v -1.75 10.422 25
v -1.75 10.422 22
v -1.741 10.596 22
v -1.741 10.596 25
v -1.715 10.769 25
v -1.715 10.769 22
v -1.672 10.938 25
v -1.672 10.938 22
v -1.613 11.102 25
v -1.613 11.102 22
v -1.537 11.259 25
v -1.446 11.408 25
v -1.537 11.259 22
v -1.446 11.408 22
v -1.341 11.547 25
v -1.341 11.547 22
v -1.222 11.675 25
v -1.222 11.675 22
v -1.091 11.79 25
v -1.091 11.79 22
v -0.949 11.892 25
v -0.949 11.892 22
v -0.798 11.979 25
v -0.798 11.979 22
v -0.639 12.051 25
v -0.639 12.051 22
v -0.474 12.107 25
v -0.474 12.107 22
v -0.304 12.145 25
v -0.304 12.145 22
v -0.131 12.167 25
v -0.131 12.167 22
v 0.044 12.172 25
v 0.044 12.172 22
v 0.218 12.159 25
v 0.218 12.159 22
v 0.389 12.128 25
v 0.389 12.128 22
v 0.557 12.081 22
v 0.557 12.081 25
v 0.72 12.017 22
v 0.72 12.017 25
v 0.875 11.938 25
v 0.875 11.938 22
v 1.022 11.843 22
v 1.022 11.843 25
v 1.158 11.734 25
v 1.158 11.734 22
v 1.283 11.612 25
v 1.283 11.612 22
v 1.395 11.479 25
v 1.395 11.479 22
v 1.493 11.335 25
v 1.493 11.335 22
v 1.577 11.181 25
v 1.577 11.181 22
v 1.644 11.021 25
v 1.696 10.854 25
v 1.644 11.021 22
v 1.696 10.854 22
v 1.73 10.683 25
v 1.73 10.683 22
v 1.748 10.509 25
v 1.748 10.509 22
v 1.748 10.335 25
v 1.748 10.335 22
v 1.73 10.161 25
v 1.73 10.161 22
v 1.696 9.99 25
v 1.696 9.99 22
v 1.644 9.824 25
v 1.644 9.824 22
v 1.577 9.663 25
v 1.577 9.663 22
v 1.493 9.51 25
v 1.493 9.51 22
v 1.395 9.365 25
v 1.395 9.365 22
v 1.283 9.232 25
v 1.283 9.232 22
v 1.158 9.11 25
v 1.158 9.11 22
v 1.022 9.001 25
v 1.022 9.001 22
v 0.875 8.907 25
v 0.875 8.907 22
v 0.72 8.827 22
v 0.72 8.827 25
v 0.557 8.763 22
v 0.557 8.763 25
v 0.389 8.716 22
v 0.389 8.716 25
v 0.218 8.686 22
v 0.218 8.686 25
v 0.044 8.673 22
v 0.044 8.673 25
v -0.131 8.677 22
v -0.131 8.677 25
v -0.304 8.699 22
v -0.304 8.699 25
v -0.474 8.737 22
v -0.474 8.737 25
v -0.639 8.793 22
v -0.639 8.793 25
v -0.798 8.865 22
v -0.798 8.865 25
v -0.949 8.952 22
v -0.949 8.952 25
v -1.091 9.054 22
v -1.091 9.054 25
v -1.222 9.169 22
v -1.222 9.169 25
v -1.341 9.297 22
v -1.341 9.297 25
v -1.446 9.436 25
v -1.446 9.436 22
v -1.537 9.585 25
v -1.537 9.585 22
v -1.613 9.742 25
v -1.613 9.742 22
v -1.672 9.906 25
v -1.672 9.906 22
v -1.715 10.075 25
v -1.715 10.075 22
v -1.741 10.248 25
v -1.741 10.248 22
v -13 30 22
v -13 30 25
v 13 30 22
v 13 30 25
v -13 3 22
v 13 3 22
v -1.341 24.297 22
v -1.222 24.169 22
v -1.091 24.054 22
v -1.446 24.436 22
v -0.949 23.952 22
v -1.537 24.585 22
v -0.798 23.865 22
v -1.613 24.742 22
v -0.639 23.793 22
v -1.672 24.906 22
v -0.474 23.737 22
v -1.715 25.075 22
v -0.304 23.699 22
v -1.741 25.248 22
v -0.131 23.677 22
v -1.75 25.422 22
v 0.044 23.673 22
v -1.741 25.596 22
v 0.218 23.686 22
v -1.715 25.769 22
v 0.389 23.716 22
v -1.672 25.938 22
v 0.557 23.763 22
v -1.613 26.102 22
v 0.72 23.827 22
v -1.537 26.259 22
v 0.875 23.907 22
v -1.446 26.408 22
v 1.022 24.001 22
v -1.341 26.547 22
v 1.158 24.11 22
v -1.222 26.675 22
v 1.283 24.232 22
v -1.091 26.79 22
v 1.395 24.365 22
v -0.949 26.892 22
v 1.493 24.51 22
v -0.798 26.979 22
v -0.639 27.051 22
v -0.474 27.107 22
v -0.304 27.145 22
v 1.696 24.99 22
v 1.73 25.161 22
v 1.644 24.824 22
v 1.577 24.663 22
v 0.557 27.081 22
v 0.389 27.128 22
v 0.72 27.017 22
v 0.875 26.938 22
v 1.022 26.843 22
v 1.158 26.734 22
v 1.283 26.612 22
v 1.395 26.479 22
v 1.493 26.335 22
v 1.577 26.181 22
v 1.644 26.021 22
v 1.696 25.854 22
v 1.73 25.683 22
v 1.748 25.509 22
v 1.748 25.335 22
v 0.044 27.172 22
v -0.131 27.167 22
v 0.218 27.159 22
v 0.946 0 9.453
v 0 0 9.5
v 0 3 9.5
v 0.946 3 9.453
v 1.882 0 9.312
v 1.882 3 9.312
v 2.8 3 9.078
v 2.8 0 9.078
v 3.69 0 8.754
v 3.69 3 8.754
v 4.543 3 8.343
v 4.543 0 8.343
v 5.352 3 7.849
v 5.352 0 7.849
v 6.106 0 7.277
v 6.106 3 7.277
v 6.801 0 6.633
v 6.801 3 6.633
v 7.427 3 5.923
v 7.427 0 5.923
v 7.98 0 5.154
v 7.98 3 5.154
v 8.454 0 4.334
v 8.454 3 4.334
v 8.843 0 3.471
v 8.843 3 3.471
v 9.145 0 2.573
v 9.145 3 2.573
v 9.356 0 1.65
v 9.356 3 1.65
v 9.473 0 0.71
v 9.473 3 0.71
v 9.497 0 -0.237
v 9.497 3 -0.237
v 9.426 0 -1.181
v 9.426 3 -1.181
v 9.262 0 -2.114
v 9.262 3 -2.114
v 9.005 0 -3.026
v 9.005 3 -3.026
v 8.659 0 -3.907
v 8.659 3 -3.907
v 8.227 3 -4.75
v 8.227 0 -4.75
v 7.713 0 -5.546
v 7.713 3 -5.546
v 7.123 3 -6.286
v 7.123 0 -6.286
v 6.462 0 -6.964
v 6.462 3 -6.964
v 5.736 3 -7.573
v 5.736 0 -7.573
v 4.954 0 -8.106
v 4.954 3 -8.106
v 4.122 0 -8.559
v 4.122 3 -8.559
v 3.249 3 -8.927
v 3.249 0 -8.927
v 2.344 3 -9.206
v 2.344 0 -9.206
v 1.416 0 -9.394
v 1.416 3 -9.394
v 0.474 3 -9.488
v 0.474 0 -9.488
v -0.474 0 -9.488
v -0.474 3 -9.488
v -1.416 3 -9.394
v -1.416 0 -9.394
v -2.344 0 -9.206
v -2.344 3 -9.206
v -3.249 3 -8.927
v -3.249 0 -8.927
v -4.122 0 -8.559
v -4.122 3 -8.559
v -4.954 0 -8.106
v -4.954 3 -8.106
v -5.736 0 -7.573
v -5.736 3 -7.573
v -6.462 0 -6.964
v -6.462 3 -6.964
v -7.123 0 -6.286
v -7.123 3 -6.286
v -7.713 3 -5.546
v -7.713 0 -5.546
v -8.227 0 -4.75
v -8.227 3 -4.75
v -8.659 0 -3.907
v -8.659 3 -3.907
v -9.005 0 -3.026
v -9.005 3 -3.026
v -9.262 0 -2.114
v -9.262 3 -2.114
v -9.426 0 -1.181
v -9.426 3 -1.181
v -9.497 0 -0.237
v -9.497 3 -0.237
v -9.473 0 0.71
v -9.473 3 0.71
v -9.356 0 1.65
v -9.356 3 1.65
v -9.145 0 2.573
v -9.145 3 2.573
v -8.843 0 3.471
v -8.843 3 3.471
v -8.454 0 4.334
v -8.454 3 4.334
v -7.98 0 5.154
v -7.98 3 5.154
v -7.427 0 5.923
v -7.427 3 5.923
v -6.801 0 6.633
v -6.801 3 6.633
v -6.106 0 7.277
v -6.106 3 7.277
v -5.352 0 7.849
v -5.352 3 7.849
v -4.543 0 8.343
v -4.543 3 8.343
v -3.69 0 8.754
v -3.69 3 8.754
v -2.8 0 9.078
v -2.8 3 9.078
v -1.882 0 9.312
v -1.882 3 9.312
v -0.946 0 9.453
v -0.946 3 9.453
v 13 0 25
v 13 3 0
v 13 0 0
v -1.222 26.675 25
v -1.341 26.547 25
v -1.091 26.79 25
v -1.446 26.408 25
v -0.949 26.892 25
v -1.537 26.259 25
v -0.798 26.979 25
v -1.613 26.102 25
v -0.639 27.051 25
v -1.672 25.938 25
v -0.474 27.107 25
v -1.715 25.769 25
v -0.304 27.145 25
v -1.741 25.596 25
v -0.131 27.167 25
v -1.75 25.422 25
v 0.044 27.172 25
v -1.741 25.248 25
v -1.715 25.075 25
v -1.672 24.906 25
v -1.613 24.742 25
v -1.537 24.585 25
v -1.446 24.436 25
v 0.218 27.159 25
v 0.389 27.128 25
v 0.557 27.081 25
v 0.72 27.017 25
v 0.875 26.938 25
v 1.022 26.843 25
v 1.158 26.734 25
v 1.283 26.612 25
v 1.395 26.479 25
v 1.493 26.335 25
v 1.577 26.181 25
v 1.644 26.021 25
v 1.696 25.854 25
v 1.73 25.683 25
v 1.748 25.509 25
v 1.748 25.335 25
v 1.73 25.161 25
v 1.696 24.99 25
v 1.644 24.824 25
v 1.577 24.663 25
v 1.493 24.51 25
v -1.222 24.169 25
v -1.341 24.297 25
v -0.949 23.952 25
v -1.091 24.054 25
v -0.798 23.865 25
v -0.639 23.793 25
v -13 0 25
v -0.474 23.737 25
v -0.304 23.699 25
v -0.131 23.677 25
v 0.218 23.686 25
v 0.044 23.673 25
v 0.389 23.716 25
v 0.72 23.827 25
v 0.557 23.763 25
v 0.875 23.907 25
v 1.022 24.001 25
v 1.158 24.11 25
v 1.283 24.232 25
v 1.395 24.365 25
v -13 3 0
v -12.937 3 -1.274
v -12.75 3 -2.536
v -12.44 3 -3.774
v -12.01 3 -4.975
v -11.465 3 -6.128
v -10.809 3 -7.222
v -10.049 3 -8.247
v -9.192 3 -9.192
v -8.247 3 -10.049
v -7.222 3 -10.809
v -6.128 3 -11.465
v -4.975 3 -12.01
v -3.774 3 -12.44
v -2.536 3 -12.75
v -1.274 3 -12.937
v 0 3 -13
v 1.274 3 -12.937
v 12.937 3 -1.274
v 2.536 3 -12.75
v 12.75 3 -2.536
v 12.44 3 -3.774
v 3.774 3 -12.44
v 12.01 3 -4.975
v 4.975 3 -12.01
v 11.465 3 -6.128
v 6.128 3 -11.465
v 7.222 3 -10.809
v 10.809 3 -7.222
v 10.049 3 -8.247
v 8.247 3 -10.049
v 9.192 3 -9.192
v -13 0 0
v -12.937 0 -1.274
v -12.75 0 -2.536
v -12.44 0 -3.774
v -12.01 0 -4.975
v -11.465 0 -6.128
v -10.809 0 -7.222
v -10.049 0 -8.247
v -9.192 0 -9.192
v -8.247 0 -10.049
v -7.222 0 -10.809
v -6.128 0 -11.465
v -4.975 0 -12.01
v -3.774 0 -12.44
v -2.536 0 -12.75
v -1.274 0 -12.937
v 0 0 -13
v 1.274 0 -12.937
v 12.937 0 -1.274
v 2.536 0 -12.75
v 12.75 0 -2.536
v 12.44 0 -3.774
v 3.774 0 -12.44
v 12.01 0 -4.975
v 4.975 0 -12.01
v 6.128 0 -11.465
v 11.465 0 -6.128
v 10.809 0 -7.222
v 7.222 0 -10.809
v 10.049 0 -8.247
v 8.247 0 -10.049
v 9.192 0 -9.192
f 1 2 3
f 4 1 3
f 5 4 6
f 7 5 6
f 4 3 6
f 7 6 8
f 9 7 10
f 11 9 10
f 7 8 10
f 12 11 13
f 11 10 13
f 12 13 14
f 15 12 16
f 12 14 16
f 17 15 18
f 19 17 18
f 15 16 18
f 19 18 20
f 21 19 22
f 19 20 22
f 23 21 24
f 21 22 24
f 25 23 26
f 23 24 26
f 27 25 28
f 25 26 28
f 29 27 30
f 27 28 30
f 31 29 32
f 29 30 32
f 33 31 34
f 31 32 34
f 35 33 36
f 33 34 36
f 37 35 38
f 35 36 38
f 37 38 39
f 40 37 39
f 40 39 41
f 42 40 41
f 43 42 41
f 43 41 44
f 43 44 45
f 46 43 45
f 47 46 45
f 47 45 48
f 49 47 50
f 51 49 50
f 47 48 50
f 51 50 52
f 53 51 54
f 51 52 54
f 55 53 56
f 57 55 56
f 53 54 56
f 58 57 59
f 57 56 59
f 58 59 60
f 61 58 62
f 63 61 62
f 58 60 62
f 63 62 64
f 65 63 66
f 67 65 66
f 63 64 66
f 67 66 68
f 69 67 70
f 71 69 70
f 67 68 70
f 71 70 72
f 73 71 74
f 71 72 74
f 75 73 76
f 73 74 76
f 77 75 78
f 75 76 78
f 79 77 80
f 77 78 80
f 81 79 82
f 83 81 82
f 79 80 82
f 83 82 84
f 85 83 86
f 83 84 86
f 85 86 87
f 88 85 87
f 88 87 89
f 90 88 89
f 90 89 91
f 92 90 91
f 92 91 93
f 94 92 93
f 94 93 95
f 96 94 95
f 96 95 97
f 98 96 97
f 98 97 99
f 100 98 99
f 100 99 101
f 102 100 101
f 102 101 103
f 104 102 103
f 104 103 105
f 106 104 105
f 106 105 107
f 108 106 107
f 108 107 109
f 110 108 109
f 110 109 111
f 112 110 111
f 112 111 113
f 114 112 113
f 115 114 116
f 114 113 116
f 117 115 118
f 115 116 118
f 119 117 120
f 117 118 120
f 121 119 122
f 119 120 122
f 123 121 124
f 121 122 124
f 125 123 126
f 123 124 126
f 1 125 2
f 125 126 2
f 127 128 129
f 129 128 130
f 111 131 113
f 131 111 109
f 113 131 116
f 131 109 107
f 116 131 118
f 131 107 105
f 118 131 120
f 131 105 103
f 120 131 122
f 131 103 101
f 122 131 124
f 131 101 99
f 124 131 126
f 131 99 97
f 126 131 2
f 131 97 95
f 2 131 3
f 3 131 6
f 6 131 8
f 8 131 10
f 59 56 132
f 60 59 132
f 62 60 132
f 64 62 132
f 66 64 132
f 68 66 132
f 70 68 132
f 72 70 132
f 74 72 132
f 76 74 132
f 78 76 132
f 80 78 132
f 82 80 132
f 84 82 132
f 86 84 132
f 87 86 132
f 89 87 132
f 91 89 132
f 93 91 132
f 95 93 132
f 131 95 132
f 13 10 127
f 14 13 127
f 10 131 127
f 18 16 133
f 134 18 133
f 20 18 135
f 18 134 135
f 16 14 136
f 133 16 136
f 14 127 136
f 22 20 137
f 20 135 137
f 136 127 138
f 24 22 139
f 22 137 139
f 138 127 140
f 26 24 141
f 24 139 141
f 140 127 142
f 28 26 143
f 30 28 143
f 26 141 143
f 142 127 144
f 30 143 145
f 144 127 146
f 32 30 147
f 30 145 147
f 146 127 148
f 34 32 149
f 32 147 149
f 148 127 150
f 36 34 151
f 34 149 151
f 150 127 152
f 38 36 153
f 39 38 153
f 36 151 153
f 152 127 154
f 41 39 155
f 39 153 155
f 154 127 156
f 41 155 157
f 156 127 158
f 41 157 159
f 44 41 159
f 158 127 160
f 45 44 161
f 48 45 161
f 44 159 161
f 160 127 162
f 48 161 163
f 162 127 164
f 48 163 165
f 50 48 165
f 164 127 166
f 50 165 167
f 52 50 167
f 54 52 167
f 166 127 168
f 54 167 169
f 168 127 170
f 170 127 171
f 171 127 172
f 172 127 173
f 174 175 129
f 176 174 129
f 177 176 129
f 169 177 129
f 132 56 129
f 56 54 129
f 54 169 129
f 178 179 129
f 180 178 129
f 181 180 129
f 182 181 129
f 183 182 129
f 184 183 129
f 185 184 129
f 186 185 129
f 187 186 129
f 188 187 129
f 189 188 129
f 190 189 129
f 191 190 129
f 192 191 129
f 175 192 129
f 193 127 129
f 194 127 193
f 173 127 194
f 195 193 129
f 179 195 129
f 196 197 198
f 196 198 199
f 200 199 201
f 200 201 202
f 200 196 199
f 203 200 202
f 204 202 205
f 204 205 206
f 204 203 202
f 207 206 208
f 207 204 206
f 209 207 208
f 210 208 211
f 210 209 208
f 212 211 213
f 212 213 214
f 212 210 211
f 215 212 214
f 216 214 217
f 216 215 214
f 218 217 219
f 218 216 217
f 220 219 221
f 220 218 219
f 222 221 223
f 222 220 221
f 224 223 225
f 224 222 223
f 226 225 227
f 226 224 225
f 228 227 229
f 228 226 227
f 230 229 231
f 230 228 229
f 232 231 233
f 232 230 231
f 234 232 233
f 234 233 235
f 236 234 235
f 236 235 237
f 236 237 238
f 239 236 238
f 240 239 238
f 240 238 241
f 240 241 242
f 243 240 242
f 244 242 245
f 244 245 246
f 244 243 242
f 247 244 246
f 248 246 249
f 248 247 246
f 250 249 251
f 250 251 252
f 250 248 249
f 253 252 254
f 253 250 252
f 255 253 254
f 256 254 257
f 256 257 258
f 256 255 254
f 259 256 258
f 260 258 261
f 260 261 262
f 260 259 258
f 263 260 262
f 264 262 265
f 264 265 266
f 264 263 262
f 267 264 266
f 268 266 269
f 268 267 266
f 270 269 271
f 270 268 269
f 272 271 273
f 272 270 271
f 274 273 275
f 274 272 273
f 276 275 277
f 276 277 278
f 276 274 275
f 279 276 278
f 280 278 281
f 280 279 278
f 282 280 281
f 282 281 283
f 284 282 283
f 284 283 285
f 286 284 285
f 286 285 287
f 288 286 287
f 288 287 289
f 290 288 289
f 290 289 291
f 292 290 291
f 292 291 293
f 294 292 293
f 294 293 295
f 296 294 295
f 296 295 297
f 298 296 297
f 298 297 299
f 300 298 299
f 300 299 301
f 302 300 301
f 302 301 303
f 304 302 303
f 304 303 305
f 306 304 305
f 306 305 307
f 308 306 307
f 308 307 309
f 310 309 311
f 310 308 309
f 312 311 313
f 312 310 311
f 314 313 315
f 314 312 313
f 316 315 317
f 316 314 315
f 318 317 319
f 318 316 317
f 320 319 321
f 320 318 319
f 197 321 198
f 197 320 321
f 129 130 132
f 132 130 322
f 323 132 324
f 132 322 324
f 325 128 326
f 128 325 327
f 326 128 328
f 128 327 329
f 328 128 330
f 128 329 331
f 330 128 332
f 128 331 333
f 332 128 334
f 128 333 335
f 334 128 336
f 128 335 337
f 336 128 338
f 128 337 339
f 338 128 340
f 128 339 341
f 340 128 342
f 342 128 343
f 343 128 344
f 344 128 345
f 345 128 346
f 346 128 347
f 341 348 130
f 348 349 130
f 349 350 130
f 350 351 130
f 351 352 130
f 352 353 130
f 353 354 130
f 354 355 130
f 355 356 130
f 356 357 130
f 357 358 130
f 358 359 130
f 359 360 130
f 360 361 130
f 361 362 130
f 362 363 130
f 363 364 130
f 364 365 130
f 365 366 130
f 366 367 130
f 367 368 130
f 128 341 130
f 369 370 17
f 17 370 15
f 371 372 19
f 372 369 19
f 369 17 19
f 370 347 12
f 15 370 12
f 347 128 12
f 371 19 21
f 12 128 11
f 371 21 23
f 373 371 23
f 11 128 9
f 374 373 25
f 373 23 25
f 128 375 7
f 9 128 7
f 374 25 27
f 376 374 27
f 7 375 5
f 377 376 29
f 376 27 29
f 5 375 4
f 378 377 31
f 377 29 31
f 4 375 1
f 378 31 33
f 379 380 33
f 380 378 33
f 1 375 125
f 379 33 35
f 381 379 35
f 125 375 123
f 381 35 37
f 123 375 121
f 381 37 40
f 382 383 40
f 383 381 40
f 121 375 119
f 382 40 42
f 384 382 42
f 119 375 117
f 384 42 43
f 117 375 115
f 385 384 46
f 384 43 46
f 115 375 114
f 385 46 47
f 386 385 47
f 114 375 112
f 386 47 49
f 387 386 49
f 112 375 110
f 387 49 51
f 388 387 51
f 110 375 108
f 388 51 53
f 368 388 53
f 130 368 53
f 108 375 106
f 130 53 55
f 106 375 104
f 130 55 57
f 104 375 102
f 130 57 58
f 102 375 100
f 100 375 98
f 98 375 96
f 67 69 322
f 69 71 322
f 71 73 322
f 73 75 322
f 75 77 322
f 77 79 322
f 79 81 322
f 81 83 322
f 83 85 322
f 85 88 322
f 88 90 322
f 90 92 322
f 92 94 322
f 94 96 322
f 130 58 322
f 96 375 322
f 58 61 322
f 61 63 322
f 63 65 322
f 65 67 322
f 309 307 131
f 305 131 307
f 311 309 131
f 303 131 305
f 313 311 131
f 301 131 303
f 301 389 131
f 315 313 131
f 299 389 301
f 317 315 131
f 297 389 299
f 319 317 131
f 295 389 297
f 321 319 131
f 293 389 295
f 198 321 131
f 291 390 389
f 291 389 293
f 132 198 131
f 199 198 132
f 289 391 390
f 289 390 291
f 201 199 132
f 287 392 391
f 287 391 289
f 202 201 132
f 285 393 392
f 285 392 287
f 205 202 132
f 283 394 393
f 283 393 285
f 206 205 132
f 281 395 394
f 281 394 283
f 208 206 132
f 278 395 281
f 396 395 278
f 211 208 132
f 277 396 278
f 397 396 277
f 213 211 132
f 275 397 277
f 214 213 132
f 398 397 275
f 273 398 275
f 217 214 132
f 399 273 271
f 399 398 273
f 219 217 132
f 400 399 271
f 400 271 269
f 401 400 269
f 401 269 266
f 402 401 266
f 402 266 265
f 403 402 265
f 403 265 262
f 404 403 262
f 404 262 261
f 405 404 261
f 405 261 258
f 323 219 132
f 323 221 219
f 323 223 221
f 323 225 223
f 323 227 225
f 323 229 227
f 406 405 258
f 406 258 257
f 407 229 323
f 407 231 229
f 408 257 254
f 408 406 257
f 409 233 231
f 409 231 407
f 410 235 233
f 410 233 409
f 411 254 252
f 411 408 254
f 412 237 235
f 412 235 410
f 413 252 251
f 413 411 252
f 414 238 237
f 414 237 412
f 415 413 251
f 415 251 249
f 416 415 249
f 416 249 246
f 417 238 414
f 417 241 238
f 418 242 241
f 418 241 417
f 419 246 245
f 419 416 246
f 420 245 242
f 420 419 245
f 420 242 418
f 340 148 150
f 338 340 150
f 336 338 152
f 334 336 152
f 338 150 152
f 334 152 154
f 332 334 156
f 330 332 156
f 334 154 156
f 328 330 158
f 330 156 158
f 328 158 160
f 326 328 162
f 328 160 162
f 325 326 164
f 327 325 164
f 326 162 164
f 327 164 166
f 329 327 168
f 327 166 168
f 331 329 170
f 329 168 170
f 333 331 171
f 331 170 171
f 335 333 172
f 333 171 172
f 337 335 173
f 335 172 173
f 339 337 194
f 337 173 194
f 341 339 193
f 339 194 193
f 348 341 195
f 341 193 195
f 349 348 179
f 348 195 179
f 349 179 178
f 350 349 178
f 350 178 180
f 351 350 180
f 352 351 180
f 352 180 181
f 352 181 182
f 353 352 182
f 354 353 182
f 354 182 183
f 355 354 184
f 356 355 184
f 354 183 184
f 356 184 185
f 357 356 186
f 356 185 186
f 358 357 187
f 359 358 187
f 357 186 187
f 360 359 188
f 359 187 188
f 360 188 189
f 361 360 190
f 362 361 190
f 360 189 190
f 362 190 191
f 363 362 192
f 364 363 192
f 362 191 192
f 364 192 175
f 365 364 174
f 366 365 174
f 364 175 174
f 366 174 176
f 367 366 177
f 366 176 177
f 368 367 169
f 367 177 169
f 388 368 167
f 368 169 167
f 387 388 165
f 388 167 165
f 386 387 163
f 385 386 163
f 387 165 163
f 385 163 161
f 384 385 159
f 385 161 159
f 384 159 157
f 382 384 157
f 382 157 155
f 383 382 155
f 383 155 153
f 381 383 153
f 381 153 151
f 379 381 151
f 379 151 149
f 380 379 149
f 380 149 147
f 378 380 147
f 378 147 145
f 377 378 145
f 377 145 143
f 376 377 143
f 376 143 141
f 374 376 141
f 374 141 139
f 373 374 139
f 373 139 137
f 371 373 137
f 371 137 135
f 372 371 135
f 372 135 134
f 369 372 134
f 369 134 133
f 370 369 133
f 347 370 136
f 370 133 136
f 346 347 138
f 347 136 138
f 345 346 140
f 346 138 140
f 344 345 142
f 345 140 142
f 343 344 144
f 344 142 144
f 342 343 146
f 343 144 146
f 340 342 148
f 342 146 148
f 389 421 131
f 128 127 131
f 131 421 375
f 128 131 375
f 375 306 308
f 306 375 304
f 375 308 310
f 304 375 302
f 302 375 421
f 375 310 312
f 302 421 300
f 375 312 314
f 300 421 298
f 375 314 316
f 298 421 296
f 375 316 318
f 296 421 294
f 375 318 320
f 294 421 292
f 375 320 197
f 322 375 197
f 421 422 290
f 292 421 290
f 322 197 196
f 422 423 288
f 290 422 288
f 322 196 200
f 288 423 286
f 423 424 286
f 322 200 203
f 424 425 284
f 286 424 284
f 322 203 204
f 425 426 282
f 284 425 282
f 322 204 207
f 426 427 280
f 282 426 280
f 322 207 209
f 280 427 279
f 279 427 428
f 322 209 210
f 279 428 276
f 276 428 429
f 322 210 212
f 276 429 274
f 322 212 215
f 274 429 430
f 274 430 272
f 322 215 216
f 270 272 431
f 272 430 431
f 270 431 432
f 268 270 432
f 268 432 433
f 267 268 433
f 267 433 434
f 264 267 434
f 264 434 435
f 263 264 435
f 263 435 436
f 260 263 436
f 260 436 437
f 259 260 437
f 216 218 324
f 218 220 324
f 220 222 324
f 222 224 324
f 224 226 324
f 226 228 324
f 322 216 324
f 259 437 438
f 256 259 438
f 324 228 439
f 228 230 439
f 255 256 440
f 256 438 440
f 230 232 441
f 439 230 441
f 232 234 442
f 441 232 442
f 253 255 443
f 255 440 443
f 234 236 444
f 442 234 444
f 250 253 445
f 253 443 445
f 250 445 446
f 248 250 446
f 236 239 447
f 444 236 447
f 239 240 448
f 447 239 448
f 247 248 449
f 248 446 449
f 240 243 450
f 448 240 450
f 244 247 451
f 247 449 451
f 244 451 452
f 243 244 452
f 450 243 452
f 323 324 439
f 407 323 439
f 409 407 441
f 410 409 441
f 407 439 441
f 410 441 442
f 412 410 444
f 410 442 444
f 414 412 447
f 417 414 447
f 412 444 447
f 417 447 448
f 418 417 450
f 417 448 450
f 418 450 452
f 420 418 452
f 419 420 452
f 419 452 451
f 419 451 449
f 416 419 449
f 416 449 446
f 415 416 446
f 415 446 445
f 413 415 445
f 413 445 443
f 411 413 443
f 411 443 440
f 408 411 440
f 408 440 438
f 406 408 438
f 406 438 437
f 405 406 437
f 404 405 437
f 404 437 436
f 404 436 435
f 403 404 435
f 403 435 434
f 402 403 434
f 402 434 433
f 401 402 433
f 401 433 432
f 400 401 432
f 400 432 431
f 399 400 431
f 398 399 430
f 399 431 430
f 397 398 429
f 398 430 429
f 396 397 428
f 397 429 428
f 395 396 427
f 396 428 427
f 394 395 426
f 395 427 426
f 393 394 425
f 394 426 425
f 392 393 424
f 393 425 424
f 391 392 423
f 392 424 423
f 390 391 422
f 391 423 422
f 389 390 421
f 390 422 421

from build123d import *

# Parameters (mm, degrees)
SKETCH_1_R          = 13
SKETCH_1_R_2        = 9.5
EXTRUDE_1_DEPTH     = 3
SKETCH_2_W          = 26
SKETCH_2_H          = 30
EXTRUDE_2_DEPTH     = 3
SKETCH_3_R          = 1.75
CUT_EXTRUDE_1_DEPTH = 3


with BuildPart() as part:
    # 草图1 → 凸台-拉伸1 (new body)
    # profile 1 of 2: a face of its own
    with BuildSketch(Plane(origin=(0, 0, 0), x_dir=(1, 0, 0), z_dir=(0, 1, 0))):
        Circle(SKETCH_1_R)
        with Locations(Location((0, 0, 0), (0, 0, 270))):
            Circle(SKETCH_1_R_2, mode=Mode.SUBTRACT)
    # profile 2 of 2: a face of its own
    with BuildSketch(Plane(origin=(0, 0, 0), x_dir=(1, 0, 0), z_dir=(0, 1, 0))):
        with BuildLine():
            ThreePointArc((13, 0), (0, -13), (-13, 0))
            Line((-13, 0), (-13, -25))
            Line((-13, -25), (13, -25))
            Line((13, -25), (13, 0))
        make_face()
    extrude(amount=EXTRUDE_1_DEPTH)

    # 草图2 → 凸台-拉伸2 (add)
    with BuildSketch(Plane.XY.offset(25)):
        with Locations((0, 15)):
            Rectangle(SKETCH_2_W, SKETCH_2_H)
    extrude(amount=-EXTRUDE_2_DEPTH)

    # 草图3 → 切除-拉伸1 (cut)
    with BuildSketch(Plane(origin=(0, 0, 22), x_dir=(-1, 0, 0), z_dir=(0, 0, -1))):
        with Locations((0, 10.422083653)):
            Circle(SKETCH_3_R)
        with Locations((0, 25.422083653)):
            Circle(SKETCH_3_R)
    extrude(amount=-CUT_EXTRUDE_1_DEPTH, mode=Mode.SUBTRACT)


solid = part.part
